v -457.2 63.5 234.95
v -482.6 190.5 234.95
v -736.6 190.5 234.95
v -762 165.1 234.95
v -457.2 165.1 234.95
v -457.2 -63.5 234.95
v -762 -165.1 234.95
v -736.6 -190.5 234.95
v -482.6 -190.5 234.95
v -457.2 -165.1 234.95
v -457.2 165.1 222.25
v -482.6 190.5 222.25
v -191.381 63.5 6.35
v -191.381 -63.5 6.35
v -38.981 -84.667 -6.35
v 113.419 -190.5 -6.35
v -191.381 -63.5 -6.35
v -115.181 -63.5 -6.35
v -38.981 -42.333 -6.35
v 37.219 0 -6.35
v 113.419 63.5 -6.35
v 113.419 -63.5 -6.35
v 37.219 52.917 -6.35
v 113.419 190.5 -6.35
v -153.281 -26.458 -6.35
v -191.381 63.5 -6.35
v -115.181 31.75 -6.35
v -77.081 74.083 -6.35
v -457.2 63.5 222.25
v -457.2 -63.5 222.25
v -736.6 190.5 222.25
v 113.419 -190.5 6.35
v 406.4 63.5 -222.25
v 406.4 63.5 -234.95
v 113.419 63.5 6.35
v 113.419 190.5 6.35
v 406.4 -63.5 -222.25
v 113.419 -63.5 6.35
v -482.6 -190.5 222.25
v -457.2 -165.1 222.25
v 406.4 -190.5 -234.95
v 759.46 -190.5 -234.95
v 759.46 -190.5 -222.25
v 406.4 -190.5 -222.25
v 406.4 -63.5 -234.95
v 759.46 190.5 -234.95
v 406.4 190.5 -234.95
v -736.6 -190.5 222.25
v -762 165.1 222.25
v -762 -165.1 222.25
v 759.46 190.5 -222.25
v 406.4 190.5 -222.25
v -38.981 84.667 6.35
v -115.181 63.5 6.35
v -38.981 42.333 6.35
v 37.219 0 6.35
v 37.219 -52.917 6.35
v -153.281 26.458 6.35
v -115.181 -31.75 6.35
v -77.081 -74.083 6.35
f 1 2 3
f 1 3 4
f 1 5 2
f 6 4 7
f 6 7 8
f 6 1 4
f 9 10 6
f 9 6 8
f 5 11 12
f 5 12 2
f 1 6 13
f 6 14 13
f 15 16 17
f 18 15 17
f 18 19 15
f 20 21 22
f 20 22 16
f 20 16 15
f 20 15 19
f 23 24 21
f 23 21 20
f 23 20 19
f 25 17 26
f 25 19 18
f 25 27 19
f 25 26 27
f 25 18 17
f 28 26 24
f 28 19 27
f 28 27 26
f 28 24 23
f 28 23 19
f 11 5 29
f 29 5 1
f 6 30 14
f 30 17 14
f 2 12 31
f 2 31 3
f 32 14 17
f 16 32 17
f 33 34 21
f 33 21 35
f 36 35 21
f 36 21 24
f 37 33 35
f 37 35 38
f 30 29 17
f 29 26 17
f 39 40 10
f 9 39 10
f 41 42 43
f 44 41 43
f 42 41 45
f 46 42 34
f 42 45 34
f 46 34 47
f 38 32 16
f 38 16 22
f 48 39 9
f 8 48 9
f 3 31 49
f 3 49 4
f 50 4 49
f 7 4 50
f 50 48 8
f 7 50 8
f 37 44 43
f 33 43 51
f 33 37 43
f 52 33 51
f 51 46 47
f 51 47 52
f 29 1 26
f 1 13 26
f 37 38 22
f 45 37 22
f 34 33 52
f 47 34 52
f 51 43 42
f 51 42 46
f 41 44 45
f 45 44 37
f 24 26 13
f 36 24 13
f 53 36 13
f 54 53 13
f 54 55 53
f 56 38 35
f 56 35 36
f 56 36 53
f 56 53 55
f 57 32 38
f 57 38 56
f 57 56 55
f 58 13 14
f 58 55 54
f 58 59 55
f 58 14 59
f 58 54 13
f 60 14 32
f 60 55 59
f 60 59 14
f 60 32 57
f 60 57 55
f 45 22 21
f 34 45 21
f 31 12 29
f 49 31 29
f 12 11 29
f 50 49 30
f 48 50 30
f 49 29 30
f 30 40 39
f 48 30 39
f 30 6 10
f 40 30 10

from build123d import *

# Parameters (mm, degrees)
F2_W      = 127
F2_H      = 12.7
F4_W      = 127
F4_H      = 12.7
F7_FACE_W = 127
F7_FACE_H = 12.7
F6_W      = 381
F6_H      = 12.7
F9_W      = 381
F9_H      = 12.7
F10_DEPTH = 304.8
F11_SIZE  = 25.4
F13_W     = 127
F13_H     = 12.7
F15_W     = 381
F15_H     = 12.7
F16_DEPTH = 353.06


with BuildPart() as f7:
    # F2 (on line) → F7 section 0
    with BuildSketch(Plane(origin=(-457.2, 0, 0), x_dir=(0, -1, 0), z_dir=(-1, 0, 0))):
        with Locations((0, 228.6)):
            Rectangle(F2_W, F2_H)
    # F4 (on line) → F7 section 1
    with BuildSketch(Plane(origin=(-191.3811564445, 0, 0), x_dir=(0, -1, 0), z_dir=(-1, 0, 0))):
        Rectangle(F4_W, F4_H)
    loft()

    # F7_face (on face) → F8 section 0
    with BuildSketch(Plane.YZ.offset(-191.3811564445)):
        Rectangle(F7_FACE_W, F7_FACE_H)
    # F6 (on line) → F8 section 1
    with BuildSketch(Plane(origin=(113.4188435555, 0, 0), x_dir=(0, -1, 0), z_dir=(-1, 0, 0))):
        Rectangle(F6_W, F6_H)
    loft()

    # F9 (on line) → F10 (join, through all)
    with BuildSketch(Plane(origin=(-457.2, 0, 0), x_dir=(0, -1, 0), z_dir=(-1, 0, 0))):
        with Locations((0, 228.6)):
            Rectangle(F9_W, F9_H)
    extrude(amount=F10_DEPTH)

    # F11
    f11_edges = [f7.edges().sort_by_distance(p)[0] for p in [
        (-457.2, -190.5, 228.6),
        (-762, -190.5, 228.6),
        (-457.2, 190.5, 228.6),
        (-762, 190.5, 228.6),
    ]]
    chamfer(f11_edges, length=F11_SIZE)

    # F14: sweep along a path in F0
    with BuildLine(Plane.XZ) as f14_path:
        Line((113.4188435555, 0), (406.4, -228.6))
    # F13 (on line) → F14 (sweep)
    with BuildSketch(Plane.YZ.offset(406.4)):
        with Locations((0, -228.6)):
            Rectangle(F13_W, F13_H)
    sweep(path=f14_path.line)

    # F15 (on line) → F16 (join)
    with BuildSketch(Plane.YZ.offset(406.4)):
        with Locations((0, -228.6)):
            Rectangle(F15_W, F15_H)
    extrude(amount=F16_DEPTH)


solid = f7.part
